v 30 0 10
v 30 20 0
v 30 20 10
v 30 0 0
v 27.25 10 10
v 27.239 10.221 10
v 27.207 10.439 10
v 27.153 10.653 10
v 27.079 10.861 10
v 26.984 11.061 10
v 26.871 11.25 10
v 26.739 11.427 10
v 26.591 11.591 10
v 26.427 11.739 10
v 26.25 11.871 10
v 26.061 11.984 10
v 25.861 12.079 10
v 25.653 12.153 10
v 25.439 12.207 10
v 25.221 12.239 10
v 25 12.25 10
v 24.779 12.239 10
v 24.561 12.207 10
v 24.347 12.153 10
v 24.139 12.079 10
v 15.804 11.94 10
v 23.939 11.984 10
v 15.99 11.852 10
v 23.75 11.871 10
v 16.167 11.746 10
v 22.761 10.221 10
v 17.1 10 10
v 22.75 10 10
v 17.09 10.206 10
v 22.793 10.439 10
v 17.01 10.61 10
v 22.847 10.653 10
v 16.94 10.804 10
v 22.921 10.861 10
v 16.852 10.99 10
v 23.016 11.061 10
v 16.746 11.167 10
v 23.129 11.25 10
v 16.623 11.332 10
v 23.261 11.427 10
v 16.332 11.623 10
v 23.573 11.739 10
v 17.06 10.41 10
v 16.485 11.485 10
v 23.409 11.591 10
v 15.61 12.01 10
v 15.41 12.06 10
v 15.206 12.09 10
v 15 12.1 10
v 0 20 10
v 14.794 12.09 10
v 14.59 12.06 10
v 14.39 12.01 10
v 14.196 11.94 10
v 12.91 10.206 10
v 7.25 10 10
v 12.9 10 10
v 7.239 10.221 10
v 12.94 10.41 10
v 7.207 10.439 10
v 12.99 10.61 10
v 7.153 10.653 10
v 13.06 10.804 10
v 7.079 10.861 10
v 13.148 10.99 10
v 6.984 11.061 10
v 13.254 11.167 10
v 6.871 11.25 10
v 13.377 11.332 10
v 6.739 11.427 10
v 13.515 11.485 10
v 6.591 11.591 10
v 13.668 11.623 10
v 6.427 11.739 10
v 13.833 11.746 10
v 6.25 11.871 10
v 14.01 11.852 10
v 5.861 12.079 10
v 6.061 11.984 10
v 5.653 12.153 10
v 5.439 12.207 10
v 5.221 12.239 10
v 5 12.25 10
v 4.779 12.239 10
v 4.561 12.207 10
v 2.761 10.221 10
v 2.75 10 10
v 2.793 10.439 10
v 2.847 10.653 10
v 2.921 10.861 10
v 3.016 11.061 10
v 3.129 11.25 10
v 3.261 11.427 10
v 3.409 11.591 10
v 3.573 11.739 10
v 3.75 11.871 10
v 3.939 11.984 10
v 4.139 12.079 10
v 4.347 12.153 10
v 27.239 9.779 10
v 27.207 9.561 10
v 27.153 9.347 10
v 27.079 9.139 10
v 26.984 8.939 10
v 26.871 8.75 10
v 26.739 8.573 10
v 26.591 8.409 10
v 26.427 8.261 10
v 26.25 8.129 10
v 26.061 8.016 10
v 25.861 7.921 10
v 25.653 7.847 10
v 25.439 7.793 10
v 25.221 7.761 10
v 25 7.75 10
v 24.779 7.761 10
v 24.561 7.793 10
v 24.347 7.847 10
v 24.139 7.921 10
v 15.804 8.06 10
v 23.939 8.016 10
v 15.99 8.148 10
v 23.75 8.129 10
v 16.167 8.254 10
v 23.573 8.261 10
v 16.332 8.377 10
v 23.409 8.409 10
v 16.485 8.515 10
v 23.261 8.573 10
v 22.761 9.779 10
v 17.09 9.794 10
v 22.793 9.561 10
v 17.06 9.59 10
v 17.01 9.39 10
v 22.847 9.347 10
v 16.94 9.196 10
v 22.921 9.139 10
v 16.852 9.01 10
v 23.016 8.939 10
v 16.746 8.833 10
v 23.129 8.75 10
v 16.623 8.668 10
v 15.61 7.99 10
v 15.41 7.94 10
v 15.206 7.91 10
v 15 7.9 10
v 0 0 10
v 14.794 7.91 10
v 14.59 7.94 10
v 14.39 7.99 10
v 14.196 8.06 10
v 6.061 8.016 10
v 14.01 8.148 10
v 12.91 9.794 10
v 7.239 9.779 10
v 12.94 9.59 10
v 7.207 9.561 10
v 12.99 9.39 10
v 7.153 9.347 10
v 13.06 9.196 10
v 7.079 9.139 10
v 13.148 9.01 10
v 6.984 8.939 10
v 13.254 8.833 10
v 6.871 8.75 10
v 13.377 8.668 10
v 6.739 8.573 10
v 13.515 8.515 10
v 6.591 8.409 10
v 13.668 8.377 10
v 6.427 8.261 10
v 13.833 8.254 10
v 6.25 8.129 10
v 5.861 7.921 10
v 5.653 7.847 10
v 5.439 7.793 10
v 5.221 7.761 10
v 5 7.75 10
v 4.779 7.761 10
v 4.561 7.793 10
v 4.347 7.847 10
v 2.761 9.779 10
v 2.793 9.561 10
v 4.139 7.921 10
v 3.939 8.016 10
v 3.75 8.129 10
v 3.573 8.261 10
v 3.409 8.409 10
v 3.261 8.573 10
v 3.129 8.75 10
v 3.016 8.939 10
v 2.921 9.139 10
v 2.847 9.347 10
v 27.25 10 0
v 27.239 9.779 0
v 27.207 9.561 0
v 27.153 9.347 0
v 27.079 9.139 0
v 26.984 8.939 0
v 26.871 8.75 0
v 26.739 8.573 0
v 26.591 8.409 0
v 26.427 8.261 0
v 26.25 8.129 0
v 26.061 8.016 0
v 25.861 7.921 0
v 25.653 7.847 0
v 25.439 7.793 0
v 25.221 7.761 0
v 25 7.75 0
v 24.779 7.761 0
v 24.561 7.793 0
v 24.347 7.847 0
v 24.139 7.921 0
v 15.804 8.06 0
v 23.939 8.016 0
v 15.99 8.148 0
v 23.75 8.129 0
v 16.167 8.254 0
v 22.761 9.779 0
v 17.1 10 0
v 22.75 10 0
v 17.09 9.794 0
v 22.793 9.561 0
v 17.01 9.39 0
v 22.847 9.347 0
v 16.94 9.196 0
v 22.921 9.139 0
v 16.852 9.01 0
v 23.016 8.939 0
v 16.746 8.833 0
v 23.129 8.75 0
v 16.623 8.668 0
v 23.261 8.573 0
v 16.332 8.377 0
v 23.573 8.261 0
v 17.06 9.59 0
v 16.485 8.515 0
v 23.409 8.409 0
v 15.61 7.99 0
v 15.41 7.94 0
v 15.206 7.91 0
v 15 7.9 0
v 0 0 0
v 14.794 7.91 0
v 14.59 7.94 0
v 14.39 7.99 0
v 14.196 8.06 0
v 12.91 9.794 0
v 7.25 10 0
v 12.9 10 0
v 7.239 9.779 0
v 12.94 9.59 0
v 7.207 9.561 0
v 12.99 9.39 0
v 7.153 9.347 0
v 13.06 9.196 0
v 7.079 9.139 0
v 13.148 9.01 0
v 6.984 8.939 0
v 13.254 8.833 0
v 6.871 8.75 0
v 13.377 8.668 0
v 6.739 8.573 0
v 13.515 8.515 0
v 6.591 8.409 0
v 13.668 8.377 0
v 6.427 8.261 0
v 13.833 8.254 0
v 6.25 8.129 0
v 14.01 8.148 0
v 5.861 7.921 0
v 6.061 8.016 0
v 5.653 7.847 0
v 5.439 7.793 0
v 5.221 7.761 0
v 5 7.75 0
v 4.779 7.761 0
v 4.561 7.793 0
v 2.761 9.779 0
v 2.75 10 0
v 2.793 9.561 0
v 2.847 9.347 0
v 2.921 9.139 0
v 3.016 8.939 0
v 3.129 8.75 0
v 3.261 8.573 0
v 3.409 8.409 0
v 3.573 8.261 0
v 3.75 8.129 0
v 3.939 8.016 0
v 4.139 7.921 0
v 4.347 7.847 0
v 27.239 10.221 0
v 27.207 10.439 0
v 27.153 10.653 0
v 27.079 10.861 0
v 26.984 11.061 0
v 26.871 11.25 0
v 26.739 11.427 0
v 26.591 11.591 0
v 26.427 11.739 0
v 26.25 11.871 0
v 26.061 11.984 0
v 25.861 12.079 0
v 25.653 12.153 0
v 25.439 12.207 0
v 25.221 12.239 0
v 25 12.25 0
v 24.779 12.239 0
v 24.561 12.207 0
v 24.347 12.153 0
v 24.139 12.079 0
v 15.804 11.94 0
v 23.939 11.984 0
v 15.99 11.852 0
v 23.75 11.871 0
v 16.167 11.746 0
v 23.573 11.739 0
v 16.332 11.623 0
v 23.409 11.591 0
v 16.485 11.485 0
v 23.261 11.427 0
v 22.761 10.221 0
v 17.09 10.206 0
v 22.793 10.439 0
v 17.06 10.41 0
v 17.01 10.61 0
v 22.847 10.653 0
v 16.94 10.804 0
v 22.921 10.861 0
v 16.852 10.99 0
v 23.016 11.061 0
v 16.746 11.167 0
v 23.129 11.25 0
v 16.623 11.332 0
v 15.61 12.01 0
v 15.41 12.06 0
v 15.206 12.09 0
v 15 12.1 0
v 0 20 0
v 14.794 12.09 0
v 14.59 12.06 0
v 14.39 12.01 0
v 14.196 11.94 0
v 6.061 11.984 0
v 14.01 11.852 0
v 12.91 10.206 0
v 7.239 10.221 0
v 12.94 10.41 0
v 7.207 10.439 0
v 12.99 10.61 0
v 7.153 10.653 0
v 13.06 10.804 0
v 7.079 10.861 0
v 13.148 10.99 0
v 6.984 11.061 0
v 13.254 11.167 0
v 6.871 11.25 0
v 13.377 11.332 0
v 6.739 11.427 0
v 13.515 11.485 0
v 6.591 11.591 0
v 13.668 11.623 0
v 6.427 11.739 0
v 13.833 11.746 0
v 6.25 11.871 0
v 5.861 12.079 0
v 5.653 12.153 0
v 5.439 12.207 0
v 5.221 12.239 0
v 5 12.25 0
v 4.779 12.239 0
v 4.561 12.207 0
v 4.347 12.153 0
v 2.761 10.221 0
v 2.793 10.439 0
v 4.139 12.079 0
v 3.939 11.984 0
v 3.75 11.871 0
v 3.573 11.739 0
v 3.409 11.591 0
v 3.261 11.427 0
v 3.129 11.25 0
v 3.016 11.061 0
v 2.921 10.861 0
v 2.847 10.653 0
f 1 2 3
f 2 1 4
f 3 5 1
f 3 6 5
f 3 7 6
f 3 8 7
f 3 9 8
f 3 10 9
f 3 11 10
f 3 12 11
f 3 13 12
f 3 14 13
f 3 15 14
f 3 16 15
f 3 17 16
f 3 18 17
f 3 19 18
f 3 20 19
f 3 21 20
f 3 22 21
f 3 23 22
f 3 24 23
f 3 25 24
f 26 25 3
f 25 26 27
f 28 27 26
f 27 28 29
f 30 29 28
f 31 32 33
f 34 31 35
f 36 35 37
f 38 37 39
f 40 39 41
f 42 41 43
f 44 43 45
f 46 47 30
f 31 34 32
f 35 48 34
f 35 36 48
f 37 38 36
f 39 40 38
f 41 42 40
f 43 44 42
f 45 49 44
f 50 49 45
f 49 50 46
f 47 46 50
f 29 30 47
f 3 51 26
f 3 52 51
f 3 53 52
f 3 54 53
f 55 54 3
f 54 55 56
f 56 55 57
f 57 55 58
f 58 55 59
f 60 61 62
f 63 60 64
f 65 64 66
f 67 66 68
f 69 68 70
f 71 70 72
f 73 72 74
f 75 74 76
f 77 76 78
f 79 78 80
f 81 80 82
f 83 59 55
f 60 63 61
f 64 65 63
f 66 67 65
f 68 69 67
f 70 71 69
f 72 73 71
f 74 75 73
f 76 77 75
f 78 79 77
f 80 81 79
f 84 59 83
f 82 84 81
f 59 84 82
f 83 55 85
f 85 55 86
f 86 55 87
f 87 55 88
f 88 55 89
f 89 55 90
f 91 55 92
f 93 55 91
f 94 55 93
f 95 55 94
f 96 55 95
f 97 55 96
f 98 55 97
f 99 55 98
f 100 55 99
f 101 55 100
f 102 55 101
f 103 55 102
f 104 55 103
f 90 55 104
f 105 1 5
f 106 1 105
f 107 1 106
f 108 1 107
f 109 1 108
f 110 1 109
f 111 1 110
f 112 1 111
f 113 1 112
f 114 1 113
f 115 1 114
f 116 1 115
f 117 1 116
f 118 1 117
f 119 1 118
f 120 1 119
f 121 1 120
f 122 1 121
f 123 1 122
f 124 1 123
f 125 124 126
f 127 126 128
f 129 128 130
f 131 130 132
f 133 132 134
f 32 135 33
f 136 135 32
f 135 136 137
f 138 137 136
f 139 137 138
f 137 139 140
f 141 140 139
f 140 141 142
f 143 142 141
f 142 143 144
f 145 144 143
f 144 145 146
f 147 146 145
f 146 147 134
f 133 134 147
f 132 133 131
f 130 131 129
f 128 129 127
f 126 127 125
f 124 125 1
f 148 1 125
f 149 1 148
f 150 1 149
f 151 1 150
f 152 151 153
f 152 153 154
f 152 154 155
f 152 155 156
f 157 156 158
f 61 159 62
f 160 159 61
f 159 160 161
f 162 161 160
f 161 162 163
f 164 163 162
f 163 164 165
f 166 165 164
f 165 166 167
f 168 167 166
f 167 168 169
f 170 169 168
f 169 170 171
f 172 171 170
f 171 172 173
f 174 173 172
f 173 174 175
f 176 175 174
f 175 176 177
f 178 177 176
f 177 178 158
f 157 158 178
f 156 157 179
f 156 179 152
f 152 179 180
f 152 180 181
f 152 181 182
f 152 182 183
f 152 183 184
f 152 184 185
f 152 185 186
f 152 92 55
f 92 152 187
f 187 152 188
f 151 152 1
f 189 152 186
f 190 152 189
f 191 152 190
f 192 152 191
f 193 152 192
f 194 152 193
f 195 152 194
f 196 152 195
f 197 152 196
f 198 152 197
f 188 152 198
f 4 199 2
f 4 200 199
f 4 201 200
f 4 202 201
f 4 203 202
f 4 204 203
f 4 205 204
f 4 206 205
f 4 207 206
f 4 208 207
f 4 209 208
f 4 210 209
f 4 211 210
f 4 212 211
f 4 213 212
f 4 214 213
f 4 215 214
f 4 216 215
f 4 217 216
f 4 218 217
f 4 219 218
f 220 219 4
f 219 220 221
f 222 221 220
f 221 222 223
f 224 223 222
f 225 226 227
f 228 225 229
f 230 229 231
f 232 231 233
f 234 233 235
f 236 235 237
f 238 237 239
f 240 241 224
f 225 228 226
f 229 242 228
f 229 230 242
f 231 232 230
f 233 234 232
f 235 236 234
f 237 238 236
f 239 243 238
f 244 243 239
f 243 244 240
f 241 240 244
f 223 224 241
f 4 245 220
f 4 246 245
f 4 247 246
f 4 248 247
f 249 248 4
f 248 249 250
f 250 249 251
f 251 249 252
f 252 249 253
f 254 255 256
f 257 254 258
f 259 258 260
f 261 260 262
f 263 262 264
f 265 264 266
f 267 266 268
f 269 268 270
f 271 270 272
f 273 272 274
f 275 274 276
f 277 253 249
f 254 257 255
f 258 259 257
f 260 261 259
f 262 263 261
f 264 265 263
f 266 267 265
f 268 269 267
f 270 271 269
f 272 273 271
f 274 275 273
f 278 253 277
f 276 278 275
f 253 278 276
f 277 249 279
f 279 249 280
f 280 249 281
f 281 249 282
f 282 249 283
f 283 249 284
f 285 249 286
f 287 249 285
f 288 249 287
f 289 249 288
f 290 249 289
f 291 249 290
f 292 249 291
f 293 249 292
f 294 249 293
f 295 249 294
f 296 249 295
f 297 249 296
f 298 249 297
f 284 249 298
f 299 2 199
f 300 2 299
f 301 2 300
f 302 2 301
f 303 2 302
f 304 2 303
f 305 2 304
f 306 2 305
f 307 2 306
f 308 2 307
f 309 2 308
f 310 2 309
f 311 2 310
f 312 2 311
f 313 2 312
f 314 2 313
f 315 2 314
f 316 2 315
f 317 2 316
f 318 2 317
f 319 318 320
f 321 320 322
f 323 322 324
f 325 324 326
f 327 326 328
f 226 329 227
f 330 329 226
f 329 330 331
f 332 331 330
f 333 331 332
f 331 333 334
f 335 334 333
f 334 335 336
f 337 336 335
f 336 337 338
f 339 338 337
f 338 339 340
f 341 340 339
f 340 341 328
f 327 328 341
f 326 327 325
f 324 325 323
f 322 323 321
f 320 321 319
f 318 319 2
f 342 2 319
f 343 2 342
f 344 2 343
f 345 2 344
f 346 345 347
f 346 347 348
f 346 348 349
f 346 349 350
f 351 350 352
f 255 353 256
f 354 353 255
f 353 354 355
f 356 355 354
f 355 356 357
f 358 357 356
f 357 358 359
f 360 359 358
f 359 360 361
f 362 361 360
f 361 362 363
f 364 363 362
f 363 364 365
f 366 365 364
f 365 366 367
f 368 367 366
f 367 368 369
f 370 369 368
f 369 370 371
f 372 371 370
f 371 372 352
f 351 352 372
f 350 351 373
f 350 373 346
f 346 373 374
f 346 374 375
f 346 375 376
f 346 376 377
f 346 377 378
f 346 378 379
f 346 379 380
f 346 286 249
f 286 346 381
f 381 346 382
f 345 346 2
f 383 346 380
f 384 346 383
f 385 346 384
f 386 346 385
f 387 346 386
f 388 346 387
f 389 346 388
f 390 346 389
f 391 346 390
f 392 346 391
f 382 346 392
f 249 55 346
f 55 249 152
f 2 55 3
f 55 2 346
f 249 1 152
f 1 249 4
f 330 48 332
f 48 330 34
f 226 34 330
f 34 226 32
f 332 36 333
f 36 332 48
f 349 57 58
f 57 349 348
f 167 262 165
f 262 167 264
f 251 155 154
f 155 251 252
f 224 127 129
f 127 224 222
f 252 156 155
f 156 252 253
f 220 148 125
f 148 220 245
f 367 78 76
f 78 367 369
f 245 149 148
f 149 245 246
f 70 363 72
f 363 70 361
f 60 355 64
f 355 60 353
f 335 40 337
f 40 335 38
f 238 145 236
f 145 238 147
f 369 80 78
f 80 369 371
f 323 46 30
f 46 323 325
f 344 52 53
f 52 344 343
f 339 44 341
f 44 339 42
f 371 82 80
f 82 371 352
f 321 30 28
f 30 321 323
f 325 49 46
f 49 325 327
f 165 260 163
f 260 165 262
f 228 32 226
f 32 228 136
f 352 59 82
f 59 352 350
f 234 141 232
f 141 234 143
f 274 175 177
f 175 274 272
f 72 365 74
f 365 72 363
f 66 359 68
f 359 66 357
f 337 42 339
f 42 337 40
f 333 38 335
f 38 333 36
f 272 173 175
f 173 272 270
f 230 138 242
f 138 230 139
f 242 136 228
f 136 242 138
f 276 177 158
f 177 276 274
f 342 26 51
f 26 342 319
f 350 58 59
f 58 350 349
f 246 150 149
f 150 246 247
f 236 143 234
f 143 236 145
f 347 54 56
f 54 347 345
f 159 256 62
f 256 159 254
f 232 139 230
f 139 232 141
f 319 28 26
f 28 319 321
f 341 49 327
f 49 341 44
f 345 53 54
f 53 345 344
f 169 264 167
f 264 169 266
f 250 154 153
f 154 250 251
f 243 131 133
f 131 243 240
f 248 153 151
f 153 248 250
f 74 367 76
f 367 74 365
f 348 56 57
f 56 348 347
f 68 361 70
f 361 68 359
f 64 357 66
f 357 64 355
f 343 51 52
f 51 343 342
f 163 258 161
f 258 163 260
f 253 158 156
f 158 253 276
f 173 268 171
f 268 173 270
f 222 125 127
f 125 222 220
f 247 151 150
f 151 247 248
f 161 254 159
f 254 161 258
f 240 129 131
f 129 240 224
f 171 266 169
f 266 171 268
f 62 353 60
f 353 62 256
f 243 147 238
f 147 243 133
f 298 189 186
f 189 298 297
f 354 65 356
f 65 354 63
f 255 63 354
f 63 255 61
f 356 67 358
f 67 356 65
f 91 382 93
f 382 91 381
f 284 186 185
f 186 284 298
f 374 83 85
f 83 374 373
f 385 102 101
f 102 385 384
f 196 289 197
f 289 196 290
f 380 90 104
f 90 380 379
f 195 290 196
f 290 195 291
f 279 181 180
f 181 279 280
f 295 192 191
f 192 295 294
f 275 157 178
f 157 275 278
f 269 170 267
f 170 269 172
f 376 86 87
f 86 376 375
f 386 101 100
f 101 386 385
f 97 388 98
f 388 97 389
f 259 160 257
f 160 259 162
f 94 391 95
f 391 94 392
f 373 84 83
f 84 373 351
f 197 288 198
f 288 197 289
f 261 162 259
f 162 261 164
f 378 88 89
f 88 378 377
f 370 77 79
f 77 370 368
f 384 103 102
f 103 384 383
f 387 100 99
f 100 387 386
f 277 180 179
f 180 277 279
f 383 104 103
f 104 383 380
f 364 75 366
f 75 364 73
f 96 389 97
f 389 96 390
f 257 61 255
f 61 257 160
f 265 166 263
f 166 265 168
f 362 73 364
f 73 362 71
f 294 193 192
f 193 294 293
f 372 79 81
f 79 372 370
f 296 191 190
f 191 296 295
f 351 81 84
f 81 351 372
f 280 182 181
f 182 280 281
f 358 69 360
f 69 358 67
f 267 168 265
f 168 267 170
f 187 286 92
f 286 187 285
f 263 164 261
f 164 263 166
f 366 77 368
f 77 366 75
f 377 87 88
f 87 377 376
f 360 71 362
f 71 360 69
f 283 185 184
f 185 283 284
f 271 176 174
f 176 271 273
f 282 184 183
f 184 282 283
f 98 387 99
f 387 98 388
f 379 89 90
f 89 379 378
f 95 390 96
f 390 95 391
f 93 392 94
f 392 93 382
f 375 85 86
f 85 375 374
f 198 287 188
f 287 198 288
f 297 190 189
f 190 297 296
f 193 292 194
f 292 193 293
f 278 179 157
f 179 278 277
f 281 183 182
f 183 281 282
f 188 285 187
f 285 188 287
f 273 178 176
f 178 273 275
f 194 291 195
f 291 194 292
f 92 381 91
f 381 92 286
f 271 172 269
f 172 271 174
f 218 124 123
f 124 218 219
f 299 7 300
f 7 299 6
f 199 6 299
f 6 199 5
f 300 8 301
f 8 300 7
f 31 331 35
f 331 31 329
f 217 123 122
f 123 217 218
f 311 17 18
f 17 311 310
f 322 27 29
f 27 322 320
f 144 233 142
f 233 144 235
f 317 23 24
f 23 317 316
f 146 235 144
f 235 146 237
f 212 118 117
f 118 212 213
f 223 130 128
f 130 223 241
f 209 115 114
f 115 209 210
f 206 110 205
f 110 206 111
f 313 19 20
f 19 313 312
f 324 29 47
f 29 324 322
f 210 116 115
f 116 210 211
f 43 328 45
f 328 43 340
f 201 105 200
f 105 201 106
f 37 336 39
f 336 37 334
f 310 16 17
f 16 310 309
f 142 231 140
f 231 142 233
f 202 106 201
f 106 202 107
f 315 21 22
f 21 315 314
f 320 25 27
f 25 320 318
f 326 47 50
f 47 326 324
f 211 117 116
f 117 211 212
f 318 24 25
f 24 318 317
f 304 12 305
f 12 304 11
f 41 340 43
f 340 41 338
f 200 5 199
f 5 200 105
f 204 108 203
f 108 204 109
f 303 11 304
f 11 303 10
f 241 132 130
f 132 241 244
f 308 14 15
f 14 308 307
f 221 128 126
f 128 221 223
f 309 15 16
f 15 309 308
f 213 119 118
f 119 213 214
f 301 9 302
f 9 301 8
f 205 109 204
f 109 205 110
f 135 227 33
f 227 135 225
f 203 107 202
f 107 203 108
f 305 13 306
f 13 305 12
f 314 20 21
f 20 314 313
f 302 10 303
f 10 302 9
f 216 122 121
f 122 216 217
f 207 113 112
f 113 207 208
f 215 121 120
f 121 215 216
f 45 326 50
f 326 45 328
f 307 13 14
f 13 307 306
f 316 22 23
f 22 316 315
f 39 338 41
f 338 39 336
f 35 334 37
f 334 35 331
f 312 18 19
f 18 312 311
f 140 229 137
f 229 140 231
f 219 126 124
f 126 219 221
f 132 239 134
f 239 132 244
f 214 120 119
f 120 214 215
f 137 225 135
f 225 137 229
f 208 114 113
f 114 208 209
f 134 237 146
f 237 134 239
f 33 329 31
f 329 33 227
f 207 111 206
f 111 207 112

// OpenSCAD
// file: ../../config.scad
// Ebike Configuration
// All dimensions in mm

// =============================================================================
// RIDER PARAMETERS
// =============================================================================
rider_height = 173;
rider_weight = 55;

// =============================================================================
// FRAME GEOMETRY
// =============================================================================
frame_size = 520;                    // Seat tube center-to-top
top_tube_effective = 545;
head_tube_length = 140;
head_tube_angle = 70;
seat_tube_angle = 72;
chainstay_length = 460;
bb_drop = 65;
wheelbase = 1080;
standover_height = 450;              // Step-through
stack = 620;
reach = 370;

// =============================================================================
// TUBE DIAMETERS
// =============================================================================
head_tube_id = 44;                   // 1-1/8" straight steerer
head_tube_od = 49;
seat_tube_id = 27.2;                 // Standard seatpost
down_tube_od = 44;
top_tube_od = 32;
seat_stay_od = 16;
chainstay_od = 22;

// =============================================================================
// MOTOR CONFIGURATION
// =============================================================================
motor_type = "mid-drive";
bb_shell_width = 68;                 // BSA standard
bb_clearance_width = 120;

// =============================================================================
// DROPOUT PARAMETERS
// =============================================================================
dropout_material = "6061-T6";
dropout_thickness = 10;
dropout_width = 45;
dropout_height = 80;
dropout_axle_spacing = 142;          // Boost thru-axle
dropout_axle_diameter = 12;

// =============================================================================
// BOTTOM BRACKET SHELL
// =============================================================================
bb_shell_od = 42;
bb_shell_id = 34.8;                  // BSA threaded
bb_thread_tpi = 24;                  // BSA 1.37" x 24 TPI

// =============================================================================
// HEAD TUBE
// =============================================================================
// Uses head_tube_length, head_tube_id, head_tube_od from above

// =============================================================================
// SEAT COLLAR
// =============================================================================
seat_collar_id = 31.8;               // For 27.2mm post with shim
seat_collar_od = 38;
seat_collar_height = 25;

// =============================================================================
// MOTOR MOUNT
// =============================================================================
motor_mount_thickness = 8;
motor_mount_width = 120;
motor_mount_height = 100;

// =============================================================================
// BATTERY MOUNT
// =============================================================================
battery_mount_thickness = 6;
battery_mount_width = 60;
battery_mount_height = 40;
battery_mount_quantity = 4;

// =============================================================================
// BRAKE MOUNT (Post Mount)
// =============================================================================
brake_mount_thickness = 10;
brake_mount_width = 80;
brake_mount_height = 50;
brake_post_bolt_spacing = 74;        // Post mount standard
brake_rotor_size_front = 180;
brake_rotor_size_rear = 160;

// =============================================================================
// CABLE GUIDES
// =============================================================================
cable_guide_length = 25;
cable_guide_width = 15;
cable_guide_height = 8;
cable_guide_quantity = 6;

// =============================================================================
// HEADSET CUPS
// =============================================================================
headset_cup_od = 44;
headset_bearing_seat = 30;

// =============================================================================
// RACK/FENDER MOUNTS
// =============================================================================
rack_mount_length = 30;
rack_mount_width = 20;
rack_mount_height = 10;
rack_mount_thread = 5;               // M5
rack_mount_quantity = 4;

// =============================================================================
// GUSSET PLATES
// =============================================================================
gusset_thickness = 6;
gusset_width = 80;
gusset_height = 60;
gusset_quantity = 2;

// =============================================================================
// COMPOSITE FRAME TUBES (FibreSeeker 3)
// =============================================================================
// Wall thickness for carbon fiber reinforced tubes
tube_wall_thickness = 3;

// Down tube (curved for step-through)
down_tube_length = 650;              // Along curve
down_tube_curve_radius = 800;        // Radius of curve

// Seat tube
seat_tube_length = 520;              // frame_size
seat_tube_od = 34;                   // Outer diameter

// Chainstays
chainstay_wall = 2.5;

// Seat stays
seat_stay_length = 480;
seat_stay_wall = 2;

// =============================================================================
// TUBE SECTIONING (for build volume constraints)
// =============================================================================
// Joint design: internal aluminum sleeve with M6 through-bolts
joint_overlap = 30;                  // Overlap length per joint
joint_bolt_diameter = 6;             // M6 bolts
joint_bolt_count = 2;                // Bolts per joint

// Section counts
down_tube_sections = 3;
seat_tube_sections = 2;
chainstay_sections = 2;
seat_stay_sections = 2;

// Sleeve parameters (CNC milled aluminum)
sleeve_wall_thickness = 2;
sleeve_length = 60;                  // Total sleeve length (2x overlap)

// =============================================================================
// MANUFACTURING TOLERANCES
// =============================================================================
tolerance_press_fit = 0.05;
tolerance_general = 0.1;

// =============================================================================
// COMMON CONSTANTS
// =============================================================================
$fn = 64;                            // Circle resolution
epsilon = 0.01;                      // For boolean operations
// main file
// Rack/Fender Mount
// CNC milled component for NestWorks C500

include <../../config.scad>

module rack_mount() {
    difference() {
        // Main body
        cube([rack_mount_length, rack_mount_width, rack_mount_height]);

        // Threaded hole for rack (M5)
        translate([rack_mount_length/2, rack_mount_width/2, -epsilon])
            cylinder(h = rack_mount_height + 2*epsilon, d = 4.2); // Tap drill for M5

        // Frame mounting holes (M4)
        translate([5, rack_mount_width/2, -epsilon])
            cylinder(h = rack_mount_height + 2*epsilon, d = 4.5);
        translate([rack_mount_length - 5, rack_mount_width/2, -epsilon])
            cylinder(h = rack_mount_height + 2*epsilon, d = 4.5);
    }
}

// Render for preview
rack_mount();
